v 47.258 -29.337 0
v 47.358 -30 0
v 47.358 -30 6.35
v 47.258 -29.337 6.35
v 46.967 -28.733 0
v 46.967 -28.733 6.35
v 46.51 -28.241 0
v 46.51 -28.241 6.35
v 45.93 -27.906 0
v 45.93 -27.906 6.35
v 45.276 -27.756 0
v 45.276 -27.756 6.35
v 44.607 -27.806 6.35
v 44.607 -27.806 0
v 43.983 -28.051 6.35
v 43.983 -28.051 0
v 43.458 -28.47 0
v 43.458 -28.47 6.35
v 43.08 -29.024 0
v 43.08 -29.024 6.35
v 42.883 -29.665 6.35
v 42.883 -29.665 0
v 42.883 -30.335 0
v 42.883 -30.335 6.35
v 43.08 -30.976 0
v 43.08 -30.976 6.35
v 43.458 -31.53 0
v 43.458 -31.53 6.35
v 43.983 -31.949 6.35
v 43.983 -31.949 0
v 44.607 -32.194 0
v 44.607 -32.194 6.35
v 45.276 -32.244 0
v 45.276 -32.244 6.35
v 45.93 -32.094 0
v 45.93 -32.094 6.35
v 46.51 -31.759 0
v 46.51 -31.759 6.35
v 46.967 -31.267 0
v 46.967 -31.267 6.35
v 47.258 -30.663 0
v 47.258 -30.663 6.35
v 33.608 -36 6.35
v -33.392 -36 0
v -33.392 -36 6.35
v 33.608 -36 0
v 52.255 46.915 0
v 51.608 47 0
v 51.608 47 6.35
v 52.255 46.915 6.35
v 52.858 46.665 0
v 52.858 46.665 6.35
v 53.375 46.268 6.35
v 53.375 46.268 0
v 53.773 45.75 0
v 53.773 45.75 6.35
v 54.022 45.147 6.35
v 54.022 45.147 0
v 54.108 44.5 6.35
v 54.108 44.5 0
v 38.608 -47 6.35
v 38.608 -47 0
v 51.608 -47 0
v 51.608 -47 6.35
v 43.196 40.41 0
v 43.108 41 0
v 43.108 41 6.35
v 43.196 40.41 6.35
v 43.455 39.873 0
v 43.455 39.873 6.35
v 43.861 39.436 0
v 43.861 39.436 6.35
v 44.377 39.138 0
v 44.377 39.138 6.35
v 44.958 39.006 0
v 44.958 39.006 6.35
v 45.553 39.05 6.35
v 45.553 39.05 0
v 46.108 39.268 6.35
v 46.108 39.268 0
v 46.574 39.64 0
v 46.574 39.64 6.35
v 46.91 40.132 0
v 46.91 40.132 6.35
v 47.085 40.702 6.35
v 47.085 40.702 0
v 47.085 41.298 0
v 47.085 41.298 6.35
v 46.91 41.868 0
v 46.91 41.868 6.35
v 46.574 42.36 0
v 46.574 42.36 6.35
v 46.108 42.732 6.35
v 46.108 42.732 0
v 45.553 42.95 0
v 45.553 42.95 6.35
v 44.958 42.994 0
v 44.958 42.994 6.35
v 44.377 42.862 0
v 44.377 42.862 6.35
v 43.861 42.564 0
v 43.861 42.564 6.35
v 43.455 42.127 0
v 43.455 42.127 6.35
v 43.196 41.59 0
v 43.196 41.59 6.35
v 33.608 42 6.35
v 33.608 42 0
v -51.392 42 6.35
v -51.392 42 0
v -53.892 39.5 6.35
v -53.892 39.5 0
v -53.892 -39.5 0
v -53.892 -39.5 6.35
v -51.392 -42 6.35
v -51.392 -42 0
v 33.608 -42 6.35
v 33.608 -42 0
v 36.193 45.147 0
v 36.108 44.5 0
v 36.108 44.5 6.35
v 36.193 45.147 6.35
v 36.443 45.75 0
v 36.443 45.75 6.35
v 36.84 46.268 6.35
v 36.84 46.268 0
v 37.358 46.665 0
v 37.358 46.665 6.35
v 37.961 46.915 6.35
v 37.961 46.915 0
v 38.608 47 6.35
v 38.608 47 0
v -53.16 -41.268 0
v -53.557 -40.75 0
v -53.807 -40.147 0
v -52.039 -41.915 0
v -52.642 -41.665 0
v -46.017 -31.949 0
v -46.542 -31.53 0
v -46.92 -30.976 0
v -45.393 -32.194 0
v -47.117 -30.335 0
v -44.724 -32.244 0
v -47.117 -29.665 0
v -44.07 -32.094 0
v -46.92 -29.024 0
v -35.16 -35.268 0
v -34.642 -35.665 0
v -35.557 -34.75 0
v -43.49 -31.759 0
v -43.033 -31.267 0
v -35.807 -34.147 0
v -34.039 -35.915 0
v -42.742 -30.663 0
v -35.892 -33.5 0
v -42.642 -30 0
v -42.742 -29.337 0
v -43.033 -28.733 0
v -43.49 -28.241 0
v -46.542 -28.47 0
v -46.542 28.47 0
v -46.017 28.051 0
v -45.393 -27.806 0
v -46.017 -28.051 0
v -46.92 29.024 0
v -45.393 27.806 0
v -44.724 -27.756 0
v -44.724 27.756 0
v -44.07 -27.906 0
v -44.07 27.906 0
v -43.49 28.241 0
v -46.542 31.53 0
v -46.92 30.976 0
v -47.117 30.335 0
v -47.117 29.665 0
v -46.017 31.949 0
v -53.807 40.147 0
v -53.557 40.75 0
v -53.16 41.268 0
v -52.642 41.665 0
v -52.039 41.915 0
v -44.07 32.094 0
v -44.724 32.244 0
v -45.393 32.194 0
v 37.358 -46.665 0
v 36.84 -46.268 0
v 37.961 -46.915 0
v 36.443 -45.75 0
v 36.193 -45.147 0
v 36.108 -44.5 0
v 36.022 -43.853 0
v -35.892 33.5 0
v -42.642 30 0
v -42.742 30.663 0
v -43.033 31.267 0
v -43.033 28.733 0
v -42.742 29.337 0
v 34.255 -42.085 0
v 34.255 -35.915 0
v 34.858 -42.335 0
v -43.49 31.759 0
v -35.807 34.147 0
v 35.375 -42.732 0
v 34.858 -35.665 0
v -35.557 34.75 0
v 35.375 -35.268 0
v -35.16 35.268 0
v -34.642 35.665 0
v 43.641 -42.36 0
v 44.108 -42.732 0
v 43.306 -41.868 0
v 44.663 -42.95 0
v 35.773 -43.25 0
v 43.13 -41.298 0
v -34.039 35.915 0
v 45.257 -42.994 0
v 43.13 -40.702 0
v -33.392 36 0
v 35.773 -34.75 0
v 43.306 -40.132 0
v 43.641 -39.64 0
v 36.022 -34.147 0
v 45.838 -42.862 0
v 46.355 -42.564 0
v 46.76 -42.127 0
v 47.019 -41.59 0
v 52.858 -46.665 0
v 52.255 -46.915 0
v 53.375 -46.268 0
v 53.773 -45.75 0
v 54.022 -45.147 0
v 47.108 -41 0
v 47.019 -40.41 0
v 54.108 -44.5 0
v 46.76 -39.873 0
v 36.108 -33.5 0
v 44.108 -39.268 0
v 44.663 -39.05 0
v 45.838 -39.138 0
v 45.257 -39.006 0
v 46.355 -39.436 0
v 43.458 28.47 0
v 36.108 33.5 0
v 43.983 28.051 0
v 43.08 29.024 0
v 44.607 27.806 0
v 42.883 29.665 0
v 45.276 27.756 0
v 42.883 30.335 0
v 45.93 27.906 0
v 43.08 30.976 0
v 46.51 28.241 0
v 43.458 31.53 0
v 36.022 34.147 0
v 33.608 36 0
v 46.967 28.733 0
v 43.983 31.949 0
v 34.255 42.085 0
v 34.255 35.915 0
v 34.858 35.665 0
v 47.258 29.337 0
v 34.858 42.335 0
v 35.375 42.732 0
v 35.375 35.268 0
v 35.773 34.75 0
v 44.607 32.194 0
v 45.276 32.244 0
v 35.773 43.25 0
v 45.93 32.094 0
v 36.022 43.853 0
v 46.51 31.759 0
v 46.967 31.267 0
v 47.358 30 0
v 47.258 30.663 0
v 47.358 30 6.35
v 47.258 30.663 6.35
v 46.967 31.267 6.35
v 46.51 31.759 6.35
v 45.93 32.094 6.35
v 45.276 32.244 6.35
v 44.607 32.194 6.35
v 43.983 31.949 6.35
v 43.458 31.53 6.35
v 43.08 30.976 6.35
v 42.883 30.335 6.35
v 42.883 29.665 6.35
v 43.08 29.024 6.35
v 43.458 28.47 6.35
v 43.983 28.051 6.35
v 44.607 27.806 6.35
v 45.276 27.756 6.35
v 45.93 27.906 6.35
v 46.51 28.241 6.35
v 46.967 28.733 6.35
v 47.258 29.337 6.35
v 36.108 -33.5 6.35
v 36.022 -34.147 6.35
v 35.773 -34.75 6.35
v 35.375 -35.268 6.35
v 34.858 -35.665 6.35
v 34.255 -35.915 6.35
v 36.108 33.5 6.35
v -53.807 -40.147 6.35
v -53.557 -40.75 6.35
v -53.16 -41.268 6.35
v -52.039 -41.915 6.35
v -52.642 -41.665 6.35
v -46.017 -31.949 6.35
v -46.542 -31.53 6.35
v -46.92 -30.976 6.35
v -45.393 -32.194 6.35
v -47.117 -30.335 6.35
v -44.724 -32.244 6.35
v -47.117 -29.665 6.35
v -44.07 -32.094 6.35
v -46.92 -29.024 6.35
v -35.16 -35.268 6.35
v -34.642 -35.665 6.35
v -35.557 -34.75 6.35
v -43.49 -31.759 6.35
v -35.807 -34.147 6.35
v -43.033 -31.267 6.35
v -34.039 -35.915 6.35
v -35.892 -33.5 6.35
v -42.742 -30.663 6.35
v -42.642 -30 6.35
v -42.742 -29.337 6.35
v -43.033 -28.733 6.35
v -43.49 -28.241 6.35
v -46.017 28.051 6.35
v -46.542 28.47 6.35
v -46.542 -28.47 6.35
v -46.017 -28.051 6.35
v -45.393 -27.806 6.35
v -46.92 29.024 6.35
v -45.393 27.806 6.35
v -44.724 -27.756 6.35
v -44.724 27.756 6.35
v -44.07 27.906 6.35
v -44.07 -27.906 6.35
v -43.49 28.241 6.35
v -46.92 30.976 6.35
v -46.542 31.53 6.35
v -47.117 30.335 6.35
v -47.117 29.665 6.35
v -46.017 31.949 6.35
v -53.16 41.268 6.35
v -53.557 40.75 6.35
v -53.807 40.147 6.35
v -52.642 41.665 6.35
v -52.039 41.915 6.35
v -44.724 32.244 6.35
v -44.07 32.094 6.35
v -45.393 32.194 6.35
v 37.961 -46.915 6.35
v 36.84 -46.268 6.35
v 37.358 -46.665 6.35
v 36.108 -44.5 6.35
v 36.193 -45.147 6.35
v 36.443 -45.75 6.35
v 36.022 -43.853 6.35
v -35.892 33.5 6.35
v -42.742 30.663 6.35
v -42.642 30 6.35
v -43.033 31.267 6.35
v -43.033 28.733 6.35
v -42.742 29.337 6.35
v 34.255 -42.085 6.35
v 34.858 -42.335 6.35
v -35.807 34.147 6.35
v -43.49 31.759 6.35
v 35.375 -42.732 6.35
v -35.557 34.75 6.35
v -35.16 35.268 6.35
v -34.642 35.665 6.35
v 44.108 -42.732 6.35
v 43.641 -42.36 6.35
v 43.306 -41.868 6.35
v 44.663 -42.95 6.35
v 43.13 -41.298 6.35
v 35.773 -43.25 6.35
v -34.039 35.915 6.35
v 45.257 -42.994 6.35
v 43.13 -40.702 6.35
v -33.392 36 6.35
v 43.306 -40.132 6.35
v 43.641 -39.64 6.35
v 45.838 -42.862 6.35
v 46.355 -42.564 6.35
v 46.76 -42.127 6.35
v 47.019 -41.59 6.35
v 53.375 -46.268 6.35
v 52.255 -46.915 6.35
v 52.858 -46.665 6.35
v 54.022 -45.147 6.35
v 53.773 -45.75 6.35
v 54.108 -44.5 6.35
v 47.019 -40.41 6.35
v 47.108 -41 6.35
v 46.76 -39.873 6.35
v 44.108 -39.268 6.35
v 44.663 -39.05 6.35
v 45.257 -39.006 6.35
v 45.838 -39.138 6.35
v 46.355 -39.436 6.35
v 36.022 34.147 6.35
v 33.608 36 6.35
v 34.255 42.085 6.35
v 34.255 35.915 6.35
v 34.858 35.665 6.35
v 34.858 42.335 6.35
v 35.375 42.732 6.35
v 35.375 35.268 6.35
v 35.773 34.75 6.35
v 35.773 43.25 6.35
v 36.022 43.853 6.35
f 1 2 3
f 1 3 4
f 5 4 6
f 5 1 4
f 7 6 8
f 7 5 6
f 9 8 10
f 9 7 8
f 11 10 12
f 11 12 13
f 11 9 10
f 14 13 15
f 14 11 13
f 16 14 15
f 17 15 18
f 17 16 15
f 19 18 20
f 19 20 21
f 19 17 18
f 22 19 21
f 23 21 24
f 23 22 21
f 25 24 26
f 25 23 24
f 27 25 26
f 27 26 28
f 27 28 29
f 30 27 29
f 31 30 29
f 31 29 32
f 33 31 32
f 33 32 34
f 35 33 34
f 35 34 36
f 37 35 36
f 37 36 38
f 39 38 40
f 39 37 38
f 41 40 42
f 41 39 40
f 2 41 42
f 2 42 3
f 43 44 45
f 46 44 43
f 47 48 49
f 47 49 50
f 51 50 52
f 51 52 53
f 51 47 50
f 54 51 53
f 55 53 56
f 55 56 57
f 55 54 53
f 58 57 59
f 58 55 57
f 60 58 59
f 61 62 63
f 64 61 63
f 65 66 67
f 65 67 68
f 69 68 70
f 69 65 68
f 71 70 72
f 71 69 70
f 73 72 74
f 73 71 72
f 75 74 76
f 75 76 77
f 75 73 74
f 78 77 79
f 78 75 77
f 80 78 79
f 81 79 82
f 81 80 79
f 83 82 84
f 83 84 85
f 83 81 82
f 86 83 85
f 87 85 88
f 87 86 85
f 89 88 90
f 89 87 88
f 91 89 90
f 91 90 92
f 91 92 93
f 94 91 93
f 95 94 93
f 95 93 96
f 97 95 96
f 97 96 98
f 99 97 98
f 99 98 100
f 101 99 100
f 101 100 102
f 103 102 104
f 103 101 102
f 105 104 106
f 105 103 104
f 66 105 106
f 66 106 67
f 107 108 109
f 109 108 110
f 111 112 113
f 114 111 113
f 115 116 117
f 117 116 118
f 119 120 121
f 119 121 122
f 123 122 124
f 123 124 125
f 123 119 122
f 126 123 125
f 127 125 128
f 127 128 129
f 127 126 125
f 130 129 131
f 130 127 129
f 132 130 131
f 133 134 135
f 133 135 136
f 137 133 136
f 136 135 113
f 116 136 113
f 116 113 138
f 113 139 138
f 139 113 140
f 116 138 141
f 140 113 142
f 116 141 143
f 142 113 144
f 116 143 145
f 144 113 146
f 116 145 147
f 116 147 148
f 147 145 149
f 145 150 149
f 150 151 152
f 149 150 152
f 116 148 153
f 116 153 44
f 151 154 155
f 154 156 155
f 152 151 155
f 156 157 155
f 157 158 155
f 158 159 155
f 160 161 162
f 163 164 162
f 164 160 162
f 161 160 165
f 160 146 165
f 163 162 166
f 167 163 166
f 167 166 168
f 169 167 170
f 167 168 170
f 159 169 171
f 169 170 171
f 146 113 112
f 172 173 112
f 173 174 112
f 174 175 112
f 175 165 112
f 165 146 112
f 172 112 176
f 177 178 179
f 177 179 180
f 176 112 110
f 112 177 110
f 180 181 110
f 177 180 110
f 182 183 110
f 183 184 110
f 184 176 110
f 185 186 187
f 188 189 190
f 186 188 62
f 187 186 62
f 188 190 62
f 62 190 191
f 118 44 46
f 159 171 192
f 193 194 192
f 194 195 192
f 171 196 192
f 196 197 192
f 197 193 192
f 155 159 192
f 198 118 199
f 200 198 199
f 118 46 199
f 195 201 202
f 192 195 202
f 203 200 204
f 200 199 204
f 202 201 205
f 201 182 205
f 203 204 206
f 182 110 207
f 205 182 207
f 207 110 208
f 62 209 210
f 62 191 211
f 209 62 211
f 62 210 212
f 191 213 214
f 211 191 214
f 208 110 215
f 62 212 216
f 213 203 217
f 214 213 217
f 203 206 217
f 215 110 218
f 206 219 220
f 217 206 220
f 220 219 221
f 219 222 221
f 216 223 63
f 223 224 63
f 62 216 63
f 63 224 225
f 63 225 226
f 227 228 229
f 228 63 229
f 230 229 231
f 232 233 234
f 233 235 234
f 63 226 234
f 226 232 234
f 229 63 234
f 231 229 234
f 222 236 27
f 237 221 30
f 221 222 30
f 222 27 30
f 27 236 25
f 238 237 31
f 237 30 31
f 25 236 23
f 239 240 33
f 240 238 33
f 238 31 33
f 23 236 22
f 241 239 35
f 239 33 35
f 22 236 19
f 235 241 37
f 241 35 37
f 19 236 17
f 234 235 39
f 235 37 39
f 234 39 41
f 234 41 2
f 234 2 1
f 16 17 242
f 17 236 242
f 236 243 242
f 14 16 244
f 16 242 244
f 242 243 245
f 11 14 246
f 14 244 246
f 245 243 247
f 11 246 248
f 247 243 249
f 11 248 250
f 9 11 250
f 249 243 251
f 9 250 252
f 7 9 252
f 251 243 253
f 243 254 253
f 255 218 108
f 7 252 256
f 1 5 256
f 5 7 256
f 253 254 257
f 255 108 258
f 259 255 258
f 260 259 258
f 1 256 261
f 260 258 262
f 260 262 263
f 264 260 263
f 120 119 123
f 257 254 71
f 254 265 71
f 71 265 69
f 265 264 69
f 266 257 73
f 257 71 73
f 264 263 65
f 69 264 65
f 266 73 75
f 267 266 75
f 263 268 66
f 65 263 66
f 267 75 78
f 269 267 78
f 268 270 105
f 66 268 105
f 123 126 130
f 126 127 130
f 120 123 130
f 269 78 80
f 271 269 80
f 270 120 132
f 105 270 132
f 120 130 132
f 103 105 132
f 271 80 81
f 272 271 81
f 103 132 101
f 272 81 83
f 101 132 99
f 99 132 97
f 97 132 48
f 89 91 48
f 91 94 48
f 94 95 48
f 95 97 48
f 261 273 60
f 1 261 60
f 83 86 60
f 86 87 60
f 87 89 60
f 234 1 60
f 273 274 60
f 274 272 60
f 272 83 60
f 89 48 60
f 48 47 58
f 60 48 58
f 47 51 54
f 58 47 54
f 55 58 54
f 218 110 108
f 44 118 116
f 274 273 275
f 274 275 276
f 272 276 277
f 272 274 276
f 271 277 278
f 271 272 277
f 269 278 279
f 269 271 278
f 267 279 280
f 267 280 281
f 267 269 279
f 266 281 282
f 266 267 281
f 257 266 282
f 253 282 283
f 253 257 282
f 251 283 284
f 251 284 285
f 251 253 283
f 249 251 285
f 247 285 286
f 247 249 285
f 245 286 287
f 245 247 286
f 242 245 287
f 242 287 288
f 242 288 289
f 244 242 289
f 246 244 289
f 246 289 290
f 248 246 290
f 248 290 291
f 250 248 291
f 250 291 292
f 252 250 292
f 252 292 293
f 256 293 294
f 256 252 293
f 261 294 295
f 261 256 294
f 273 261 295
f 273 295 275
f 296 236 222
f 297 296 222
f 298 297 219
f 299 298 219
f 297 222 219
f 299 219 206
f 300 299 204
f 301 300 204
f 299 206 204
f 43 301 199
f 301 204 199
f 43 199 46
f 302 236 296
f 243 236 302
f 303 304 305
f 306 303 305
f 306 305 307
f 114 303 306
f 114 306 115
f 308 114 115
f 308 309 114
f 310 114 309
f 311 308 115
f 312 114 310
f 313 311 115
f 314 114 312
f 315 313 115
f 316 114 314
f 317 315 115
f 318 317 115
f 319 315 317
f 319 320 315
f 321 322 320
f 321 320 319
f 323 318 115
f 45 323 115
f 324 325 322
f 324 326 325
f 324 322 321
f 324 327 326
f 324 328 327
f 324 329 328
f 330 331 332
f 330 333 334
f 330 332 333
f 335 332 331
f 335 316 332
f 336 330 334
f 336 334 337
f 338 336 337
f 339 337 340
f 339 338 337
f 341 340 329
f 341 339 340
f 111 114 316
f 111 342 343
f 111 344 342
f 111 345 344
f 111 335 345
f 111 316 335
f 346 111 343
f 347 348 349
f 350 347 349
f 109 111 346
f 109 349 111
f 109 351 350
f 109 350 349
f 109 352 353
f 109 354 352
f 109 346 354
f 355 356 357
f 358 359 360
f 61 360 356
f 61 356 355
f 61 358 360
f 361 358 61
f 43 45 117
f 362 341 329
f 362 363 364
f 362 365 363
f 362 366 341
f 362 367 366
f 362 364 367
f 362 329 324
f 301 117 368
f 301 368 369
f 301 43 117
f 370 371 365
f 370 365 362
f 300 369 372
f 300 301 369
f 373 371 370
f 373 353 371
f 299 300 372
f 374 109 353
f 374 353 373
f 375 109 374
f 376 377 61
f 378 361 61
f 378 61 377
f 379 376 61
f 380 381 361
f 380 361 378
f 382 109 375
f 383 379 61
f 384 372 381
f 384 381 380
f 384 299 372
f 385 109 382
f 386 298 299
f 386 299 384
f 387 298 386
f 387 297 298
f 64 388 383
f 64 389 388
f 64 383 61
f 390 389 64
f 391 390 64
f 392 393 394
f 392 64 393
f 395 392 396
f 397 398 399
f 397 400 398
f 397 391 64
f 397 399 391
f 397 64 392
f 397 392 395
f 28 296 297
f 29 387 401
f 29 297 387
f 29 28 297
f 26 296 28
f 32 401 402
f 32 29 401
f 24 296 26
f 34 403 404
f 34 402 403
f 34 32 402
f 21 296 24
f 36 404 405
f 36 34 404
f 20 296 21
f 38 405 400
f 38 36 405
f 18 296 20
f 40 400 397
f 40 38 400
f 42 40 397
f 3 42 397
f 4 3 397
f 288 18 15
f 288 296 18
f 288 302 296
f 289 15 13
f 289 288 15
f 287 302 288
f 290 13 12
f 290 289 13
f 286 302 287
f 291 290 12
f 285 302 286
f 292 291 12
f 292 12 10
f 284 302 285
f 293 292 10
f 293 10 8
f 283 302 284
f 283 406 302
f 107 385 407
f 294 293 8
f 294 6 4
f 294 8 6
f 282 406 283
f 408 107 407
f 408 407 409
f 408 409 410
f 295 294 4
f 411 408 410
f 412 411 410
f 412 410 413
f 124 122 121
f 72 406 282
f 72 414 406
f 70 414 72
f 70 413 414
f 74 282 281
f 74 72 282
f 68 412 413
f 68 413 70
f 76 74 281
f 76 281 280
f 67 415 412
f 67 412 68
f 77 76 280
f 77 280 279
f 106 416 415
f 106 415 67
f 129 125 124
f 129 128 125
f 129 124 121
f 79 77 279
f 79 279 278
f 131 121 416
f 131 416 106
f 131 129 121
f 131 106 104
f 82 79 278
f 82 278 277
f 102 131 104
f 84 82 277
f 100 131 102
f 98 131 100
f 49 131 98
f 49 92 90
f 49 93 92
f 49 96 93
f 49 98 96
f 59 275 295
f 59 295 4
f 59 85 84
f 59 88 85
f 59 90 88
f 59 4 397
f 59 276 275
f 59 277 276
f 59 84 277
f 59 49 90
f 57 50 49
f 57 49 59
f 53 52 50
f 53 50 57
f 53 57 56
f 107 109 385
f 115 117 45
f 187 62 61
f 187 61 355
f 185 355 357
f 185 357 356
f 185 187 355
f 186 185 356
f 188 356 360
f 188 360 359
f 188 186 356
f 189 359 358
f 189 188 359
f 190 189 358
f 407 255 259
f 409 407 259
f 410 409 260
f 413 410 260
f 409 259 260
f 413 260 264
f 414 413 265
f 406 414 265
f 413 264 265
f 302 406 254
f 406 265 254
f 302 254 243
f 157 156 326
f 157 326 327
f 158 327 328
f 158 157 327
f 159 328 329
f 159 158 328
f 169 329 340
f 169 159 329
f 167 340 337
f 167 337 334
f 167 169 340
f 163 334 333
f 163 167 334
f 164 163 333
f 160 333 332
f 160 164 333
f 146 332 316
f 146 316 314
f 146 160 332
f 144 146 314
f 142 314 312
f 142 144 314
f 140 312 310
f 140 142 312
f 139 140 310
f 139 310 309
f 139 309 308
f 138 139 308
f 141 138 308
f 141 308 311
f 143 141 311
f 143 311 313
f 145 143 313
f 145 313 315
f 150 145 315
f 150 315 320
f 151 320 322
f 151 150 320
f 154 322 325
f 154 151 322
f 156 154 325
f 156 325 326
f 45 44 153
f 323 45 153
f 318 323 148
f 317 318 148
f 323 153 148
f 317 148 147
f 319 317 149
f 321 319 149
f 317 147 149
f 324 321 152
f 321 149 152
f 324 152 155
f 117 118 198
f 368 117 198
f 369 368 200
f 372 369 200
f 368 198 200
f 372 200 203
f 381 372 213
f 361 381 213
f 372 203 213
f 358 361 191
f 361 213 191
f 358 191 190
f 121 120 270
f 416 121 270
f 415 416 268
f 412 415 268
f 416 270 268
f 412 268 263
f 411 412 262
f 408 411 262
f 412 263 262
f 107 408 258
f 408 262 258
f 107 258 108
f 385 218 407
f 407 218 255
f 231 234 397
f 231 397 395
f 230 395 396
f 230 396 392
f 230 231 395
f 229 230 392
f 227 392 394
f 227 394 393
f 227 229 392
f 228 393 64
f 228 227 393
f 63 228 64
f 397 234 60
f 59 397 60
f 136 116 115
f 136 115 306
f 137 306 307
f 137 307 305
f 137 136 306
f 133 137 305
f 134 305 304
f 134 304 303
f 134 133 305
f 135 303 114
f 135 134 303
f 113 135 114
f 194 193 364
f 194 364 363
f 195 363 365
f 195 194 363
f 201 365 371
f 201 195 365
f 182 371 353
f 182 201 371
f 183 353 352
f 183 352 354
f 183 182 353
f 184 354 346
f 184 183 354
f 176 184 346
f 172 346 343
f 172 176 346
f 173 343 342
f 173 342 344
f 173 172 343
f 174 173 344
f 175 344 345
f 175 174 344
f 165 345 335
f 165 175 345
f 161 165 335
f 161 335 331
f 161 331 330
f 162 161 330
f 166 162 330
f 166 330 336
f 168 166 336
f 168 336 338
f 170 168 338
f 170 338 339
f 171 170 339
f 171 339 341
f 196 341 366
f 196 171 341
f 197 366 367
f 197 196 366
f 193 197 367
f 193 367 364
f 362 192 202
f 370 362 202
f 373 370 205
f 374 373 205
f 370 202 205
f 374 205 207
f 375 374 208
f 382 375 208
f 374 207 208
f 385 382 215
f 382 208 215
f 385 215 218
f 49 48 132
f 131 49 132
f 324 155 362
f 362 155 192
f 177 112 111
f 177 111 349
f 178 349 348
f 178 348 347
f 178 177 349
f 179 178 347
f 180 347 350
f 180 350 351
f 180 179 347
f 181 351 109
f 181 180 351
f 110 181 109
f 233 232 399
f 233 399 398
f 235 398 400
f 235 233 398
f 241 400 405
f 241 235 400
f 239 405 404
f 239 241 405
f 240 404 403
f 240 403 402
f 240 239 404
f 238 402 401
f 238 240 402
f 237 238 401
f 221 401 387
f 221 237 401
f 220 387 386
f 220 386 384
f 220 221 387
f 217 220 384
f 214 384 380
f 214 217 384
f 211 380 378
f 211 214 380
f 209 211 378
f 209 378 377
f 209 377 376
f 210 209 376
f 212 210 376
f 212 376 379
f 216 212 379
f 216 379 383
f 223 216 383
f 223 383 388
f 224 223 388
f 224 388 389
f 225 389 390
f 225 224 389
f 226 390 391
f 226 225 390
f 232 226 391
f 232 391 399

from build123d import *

# Parameters (mm, degrees)
SKETCH1_R           = 2.25
SKETCH1_R_2         = 2
SKETCH1_W           = 72
SKETCH1_H           = 72
BOSS_EXTRUDE1_DEPTH = 6.35
FILLET1_START       = -1
FILLET1_DEPTH       = 8
FILLET1_2_DEPTH     = 6.35


with BuildPart() as part:
    # Sketch1 → Boss-Extrude1 (new body)
    with BuildSketch(Plane.XY):
        Polygon((54.107594743, 42), (54.107594743, 47), (36.107594743, 47), (36.107594743, 42), (-53.892405257, 42), (-53.892405257, -42), (36.107594743, -42), (36.107594743, -47), (54.107594743, -47), (54.107594743, -42), align=None)
        with Locations((-44.892405257, 30)):
            Circle(SKETCH1_R, mode=Mode.SUBTRACT)
        with Locations((45.107594743, 30)):
            Circle(SKETCH1_R, mode=Mode.SUBTRACT)
        with Locations((45.107594743, -30)):
            Circle(SKETCH1_R, mode=Mode.SUBTRACT)
        with Locations((-44.892405257, -30)):
            Circle(SKETCH1_R, mode=Mode.SUBTRACT)
        with Locations((45.107594743, -41)):
            Circle(SKETCH1_R_2, mode=Mode.SUBTRACT)
        with Locations(Location((45.107594743, 41, 0), (0, 0, 180))):
            Circle(SKETCH1_R_2, mode=Mode.SUBTRACT)
        with Locations((0.107594743, 0)):
            Rectangle(SKETCH1_W, SKETCH1_H, mode=Mode.SUBTRACT)
    extrude(amount=BOSS_EXTRUDE1_DEPTH)

    # Fillet1: read off the stored shape, not the designer's step
    # Fillet1 outline → Fillet1 (cut)
    with BuildSketch(Plane.XY.offset(FILLET1_START)):
        with BuildLine():
            Line((36.107594743, 47), (36.107594743, 44.5))
            ThreePointArc((36.107594743, 44.5), (36.83982779, 46.267766953), (38.607594743, 47))
            Line((38.607594743, 47), (36.107594743, 47))
        make_face()
        with BuildLine():
            Line((54.107594743, 47), (51.607594743, 47))
            ThreePointArc((51.607594743, 47), (53.375361696, 46.267766953), (54.107594743, 44.5))
            Line((54.107594743, 44.5), (54.107594743, 47))
        make_face()
        with BuildLine():
            ThreePointArc((-53.892405257, 39.5), (-53.16017221, 41.267766953), (-51.392405257, 42))
            Line((-51.392405257, 42), (-53.892405257, 42))
            Line((-53.892405257, 42), (-53.892405257, 39.5))
        make_face()
        with BuildLine():
            Line((54.107594743, -47), (54.107594743, -44.5))
            ThreePointArc((54.107594743, -44.5), (53.375361696, -46.267766953), (51.607594743, -47))
            Line((51.607594743, -47), (54.107594743, -47))
        make_face()
        with BuildLine():
            ThreePointArc((-51.392405257, -42), (-53.16017221, -41.267766953), (-53.892405257, -39.5))
            Line((-53.892405257, -39.5), (-53.892405257, -42))
            Line((-53.892405257, -42), (-51.392405257, -42))
        make_face()
        with BuildLine():
            Line((36.107594743, -47), (38.607594743, -47))
            ThreePointArc((38.607594743, -47), (36.83982779, -46.267766953), (36.107594743, -44.5))
            Line((36.107594743, -44.5), (36.107594743, -47))
        make_face()
    extrude(amount=FILLET1_DEPTH, mode=Mode.SUBTRACT)

    # Fillet1 2 outline → Fillet1 2 (add)
    with BuildSketch(Plane.XY):
        with BuildLine():
            ThreePointArc((36.107594743, -33.5), (35.375361696, -35.267766953), (33.607594743, -36))
            Line((33.607594743, -36), (36.107594743, -36))
            Line((36.107594743, -36), (36.107594743, -33.5))
        make_face()
        with BuildLine():
            Line((-35.892405257, -36), (-33.392405257, -36))
            ThreePointArc((-33.392405257, -36), (-35.16017221, -35.267766953), (-35.892405257, -33.5))
            Line((-35.892405257, -33.5), (-35.892405257, -36))
        make_face()
        with BuildLine():
            ThreePointArc((33.607594743, 36), (35.375361696, 35.267766953), (36.107594743, 33.5))
            Line((36.107594743, 33.5), (36.107594743, 36))
            Line((36.107594743, 36), (33.607594743, 36))
        make_face()
        with BuildLine():
            Line((-35.892405257, 36), (-35.892405257, 33.5))
            ThreePointArc((-35.892405257, 33.5), (-35.16017221, 35.267766953), (-33.392405257, 36))
            Line((-33.392405257, 36), (-35.892405257, 36))
        make_face()
        with BuildLine():
            Line((36.107594743, 42), (36.107594743, 44.5))
            ThreePointArc((36.107594743, 44.5), (35.375361696, 42.732233047), (33.607594743, 42))
            Line((33.607594743, 42), (36.107594743, 42))
        make_face()
        with BuildLine():
            Line((36.107594743, -42), (33.607594743, -42))
            ThreePointArc((33.607594743, -42), (35.375361696, -42.732233047), (36.107594743, -44.5))
            Line((36.107594743, -44.5), (36.107594743, -42))
        make_face()
    extrude(amount=FILLET1_2_DEPTH)


solid = part.part
